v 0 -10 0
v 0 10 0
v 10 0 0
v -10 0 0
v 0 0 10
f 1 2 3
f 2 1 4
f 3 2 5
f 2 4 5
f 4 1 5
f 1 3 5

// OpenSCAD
polyhedron(
  points = [
    [10, 0, 0],
    [0, 10, 0],
    [-10, 0, 0],
    [0, -10, 0],
    [0, 0, 10]
  ],
  triangles = [
    [0, 1, 2, 3],
    [4, 1, 0],
    [4, 2, 1],
    [4, 3, 2],
    [4, 0, 3]
  ]
);
